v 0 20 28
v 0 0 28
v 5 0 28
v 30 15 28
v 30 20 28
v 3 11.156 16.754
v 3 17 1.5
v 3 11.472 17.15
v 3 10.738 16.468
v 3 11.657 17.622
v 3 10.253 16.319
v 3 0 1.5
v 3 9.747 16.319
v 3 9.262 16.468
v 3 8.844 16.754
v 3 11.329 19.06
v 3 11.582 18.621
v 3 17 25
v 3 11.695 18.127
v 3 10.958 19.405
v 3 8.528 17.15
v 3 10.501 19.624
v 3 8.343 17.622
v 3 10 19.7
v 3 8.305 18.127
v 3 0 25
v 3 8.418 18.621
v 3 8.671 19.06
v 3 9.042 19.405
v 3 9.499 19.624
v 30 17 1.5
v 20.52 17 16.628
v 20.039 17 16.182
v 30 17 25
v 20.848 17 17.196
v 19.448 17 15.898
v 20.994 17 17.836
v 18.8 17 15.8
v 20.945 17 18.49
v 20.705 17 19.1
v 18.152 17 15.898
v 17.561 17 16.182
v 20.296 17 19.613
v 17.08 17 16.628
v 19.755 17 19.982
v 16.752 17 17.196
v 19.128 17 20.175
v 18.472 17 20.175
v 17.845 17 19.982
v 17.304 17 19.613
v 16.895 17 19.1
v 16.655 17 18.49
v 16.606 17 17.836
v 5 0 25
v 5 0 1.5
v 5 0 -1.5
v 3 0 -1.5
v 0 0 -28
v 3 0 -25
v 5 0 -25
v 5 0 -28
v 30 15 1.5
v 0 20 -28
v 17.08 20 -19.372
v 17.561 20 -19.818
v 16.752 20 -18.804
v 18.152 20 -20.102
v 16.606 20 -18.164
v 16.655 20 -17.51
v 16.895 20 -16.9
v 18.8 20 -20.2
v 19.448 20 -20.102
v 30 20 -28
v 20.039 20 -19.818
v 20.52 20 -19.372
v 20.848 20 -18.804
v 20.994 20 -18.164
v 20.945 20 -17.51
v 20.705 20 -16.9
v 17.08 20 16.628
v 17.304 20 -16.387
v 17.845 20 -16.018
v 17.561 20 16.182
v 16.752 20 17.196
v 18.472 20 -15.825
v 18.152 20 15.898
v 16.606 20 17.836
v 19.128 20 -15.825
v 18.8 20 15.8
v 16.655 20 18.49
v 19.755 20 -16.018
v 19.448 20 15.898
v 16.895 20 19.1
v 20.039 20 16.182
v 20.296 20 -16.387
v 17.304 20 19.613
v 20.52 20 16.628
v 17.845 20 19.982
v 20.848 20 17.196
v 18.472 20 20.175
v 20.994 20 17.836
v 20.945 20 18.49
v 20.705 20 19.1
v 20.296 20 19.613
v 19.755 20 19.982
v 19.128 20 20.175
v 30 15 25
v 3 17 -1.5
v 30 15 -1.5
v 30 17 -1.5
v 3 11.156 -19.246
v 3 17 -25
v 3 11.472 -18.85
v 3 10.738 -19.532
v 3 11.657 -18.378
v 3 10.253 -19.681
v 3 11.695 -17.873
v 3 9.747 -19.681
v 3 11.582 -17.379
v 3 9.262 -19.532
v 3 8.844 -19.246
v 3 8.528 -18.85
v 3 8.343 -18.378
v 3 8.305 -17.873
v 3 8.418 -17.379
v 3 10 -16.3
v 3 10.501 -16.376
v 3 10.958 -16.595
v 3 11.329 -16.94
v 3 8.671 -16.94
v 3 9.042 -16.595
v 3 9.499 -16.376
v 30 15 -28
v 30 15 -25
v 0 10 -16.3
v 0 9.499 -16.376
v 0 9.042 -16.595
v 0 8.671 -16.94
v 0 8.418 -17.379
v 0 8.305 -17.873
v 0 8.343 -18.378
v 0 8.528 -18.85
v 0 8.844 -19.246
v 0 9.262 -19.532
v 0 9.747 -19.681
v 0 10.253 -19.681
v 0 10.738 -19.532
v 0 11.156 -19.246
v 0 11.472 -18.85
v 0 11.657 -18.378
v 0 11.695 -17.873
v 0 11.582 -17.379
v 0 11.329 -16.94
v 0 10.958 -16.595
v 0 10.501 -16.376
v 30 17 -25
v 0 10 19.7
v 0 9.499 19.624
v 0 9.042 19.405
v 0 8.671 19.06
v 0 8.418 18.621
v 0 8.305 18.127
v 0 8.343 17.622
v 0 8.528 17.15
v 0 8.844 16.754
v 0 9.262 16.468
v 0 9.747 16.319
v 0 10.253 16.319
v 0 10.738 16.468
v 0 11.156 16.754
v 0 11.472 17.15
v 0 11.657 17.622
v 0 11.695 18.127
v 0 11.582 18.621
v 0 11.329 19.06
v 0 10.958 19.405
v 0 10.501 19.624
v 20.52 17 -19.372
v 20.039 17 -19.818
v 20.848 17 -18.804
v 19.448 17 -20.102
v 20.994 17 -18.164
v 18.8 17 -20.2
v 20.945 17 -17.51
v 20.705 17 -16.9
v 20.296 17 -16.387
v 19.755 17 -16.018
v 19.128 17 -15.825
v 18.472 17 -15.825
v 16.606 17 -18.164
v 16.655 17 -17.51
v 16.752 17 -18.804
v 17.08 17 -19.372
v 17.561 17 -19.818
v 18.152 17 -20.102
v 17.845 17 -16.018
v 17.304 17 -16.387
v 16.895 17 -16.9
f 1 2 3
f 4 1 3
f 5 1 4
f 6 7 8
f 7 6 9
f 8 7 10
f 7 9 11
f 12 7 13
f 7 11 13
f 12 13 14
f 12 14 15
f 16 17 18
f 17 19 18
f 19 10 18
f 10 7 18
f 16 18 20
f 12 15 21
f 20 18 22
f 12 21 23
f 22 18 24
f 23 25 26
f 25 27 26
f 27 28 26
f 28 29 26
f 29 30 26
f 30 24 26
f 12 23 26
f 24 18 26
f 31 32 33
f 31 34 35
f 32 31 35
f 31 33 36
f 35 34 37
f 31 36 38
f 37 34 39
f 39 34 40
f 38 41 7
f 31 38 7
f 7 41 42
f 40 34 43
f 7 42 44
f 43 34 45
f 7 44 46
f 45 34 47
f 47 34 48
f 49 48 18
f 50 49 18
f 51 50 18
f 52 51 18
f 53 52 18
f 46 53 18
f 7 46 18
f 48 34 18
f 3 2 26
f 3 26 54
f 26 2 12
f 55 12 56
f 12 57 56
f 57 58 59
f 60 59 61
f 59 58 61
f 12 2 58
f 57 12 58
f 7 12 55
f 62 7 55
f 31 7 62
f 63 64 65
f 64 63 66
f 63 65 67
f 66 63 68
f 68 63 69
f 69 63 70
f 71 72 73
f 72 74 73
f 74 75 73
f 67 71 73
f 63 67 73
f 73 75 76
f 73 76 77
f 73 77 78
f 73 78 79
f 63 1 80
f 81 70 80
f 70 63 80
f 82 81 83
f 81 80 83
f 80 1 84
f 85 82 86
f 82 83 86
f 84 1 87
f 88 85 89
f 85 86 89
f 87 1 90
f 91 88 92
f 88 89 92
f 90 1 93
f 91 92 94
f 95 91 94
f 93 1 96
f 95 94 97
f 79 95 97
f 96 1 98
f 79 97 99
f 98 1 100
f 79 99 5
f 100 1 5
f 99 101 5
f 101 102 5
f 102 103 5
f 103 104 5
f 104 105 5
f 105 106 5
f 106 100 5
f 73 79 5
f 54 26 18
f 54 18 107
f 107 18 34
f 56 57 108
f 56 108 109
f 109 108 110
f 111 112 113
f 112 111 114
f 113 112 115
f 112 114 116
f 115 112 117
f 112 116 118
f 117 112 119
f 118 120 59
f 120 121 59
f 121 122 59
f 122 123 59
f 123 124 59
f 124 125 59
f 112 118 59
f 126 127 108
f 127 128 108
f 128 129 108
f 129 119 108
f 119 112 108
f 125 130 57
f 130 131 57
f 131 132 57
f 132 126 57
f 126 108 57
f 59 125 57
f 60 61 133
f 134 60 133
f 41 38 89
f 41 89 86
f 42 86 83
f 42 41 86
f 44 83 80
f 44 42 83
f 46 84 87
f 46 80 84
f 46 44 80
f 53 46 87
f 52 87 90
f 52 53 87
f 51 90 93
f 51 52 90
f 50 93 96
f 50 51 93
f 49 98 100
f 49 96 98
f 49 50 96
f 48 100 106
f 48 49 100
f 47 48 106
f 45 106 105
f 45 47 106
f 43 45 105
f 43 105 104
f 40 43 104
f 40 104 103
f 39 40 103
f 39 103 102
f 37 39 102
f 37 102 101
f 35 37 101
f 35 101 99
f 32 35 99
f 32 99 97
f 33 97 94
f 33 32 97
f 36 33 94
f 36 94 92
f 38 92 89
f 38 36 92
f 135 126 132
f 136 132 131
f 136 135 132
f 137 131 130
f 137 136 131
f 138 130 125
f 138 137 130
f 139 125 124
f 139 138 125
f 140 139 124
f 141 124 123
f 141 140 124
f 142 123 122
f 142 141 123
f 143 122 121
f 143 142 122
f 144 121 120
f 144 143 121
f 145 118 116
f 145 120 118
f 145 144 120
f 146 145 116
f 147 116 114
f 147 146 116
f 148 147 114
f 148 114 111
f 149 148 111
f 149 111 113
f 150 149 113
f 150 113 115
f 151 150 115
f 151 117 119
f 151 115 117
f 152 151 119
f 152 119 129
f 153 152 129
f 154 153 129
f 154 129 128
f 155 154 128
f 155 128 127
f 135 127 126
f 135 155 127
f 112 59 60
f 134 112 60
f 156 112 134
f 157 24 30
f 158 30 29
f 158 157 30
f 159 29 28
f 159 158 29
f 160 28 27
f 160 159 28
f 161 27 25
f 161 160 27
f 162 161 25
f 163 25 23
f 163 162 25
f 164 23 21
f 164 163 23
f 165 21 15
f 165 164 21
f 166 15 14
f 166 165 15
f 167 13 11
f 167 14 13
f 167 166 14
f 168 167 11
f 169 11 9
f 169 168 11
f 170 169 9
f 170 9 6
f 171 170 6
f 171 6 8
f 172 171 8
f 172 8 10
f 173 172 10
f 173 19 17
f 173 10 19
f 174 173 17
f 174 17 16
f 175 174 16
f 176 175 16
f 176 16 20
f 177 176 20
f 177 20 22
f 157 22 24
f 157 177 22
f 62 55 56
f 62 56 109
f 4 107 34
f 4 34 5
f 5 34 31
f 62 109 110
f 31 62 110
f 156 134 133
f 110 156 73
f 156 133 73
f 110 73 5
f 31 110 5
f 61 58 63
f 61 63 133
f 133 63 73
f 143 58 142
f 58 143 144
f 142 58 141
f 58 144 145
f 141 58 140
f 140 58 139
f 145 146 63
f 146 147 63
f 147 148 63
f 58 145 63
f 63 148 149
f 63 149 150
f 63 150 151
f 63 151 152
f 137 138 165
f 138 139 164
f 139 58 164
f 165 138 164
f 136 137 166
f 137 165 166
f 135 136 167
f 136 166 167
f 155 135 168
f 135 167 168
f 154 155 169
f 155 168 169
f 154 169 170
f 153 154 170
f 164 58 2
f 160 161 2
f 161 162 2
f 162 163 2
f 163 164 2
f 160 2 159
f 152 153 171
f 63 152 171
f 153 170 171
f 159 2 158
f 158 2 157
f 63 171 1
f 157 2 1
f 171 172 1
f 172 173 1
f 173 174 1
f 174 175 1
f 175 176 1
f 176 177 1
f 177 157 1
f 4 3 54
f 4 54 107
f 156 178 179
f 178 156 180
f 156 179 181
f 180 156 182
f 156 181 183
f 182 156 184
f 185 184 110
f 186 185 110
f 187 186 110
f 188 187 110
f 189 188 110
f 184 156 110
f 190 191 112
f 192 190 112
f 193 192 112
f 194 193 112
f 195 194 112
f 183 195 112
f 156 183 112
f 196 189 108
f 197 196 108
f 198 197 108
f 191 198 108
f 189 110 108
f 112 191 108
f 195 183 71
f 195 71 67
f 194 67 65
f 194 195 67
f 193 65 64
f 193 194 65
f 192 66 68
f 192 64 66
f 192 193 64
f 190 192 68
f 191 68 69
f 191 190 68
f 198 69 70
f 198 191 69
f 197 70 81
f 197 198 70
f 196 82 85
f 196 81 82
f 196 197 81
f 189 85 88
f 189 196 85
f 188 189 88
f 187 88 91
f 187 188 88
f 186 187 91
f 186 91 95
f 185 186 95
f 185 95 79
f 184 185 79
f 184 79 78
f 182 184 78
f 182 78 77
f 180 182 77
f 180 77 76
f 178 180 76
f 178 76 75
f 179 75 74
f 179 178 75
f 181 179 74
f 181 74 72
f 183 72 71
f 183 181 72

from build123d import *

# Parameters (mm, degrees)
EXTRUDE_1_DEPTH     = 28
EXTRUDE_START       = 28
EXTRUDE_2_DEPTH     = 3
EXTRUDE_3_DEPTH     = 1.5
EXTRUDE_START_2     = -28
EXTRUDE_4_DEPTH     = 3
CUT_EXTRUDE_1_REACH = 47.651
SKETCH_3_R          = 2.2
CUT_EXTRUDE_2_REACH = 47.651
SKETCH_4_R          = 1.7


with BuildPart() as part:
    # 草图1 → 凸台-拉伸1 (new, symmetric)
    with BuildSketch(Plane.XY):
        Polygon((0, 0), (0, 20), (30, 20), (30, 17), (3, 17), (3, 0), align=None)
    extrude(amount=EXTRUDE_1_DEPTH, both=True)

    # 草图2 → 凸台-拉伸2 (add)
    with BuildSketch(Plane.XY.offset(EXTRUDE_START)):
        Polygon((3, 0), (5, 0), (30, 15), (30, 17), (3, 17), align=None)
    extrude(amount=-EXTRUDE_2_DEPTH)

    # 草图2<2> → 凸台-拉伸3 (add, symmetric)
    with BuildSketch(Plane.XY):
        Polygon((3, 0), (5, 0), (30, 15), (30, 17), (3, 17), align=None)
    extrude(amount=EXTRUDE_3_DEPTH, both=True)

    # 草图2<3> → 凸台-拉伸4 (add)
    with BuildSketch(Plane.XY.offset(EXTRUDE_START_2)):
        Polygon((3, 0), (5, 0), (30, 15), (30, 17), (3, 17), align=None)
    extrude(amount=EXTRUDE_4_DEPTH)

    # 草图3 → 切除-拉伸1 (cut, up to next)
    with BuildSketch(Plane(origin=(0, 0, 0), x_dir=(1, 0, 0), z_dir=(0, 1, 0)), mode=Mode.PRIVATE) as cut_extrude_1_sk1:
        with Locations(Location((18.8, 18, 0), (0, 0, 90))):
            Circle(SKETCH_3_R)
    cut_extrude_1_tool1 = extrude(cut_extrude_1_sk1.sketch, amount=CUT_EXTRUDE_1_REACH, mode=Mode.PRIVATE) & part.part
    # 草图3 → 切除-拉伸1 (cut, up to next)
    with BuildSketch(Plane(origin=(0, 0, 0), x_dir=(1, 0, 0), z_dir=(0, 1, 0)), mode=Mode.PRIVATE) as cut_extrude_1_sk2:
        with Locations(Location((18.8, -18, 0), (0, 0, 90))):
            Circle(SKETCH_3_R)
    cut_extrude_1_tool2 = extrude(cut_extrude_1_sk2.sketch, amount=CUT_EXTRUDE_1_REACH, mode=Mode.PRIVATE) & part.part
    add(cut_extrude_1_tool1.solids().sort_by_distance((18.8, 0, -18))[0], mode=Mode.SUBTRACT)
    add(cut_extrude_1_tool2.solids().sort_by_distance((18.8, 0, 18))[0], mode=Mode.SUBTRACT)

    # 草图4 → 切除-拉伸2 (cut, up to next)
    with BuildSketch(Plane(origin=(0, 0, 0), x_dir=(0, 0, -1), z_dir=(1, 0, 0)), mode=Mode.PRIVATE) as cut_extrude_2_sk1:
        with Locations(Location((-18, 10, 0), (0, 0, 180))):
            Circle(SKETCH_4_R)
    cut_extrude_2_tool1 = extrude(cut_extrude_2_sk1.sketch, amount=CUT_EXTRUDE_2_REACH, mode=Mode.PRIVATE) & part.part
    # 草图4 → 切除-拉伸2 (cut, up to next)
    with BuildSketch(Plane(origin=(0, 0, 0), x_dir=(0, 0, -1), z_dir=(1, 0, 0)), mode=Mode.PRIVATE) as cut_extrude_2_sk2:
        with Locations(Location((18, 10, 0), (0, 0, 180))):
            Circle(SKETCH_4_R)
    cut_extrude_2_tool2 = extrude(cut_extrude_2_sk2.sketch, amount=CUT_EXTRUDE_2_REACH, mode=Mode.PRIVATE) & part.part
    add(cut_extrude_2_tool1.solids().sort_by_distance((0, 10, 18))[0], mode=Mode.SUBTRACT)
    add(cut_extrude_2_tool2.solids().sort_by_distance((0, 10, -18))[0], mode=Mode.SUBTRACT)


solid = part.part
